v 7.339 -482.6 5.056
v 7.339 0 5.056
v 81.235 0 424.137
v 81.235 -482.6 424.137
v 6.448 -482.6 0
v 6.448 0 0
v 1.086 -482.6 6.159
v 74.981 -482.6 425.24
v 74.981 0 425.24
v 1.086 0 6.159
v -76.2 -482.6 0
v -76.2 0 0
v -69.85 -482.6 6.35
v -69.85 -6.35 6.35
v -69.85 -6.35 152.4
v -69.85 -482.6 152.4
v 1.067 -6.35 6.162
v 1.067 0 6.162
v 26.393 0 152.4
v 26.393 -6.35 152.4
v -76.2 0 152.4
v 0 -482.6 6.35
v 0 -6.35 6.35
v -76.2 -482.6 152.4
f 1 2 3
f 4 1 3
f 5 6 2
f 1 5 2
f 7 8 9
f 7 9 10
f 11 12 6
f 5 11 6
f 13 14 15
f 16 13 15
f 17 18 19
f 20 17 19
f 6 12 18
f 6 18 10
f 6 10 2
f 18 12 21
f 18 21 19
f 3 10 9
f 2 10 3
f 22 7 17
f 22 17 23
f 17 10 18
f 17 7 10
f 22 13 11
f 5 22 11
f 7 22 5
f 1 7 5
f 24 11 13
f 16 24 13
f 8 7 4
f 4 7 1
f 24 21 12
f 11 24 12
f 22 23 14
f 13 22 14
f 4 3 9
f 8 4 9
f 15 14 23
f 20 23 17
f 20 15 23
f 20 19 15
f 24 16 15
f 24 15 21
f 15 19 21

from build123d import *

# Parameters (mm, degrees)
F1_DEPTH = 482.6
F3_DEPTH = 6.35


with BuildPart() as f1:
    # F0 (on Front) → F1 (new body)
    with BuildSketch(Plane.XZ):
        Polygon((-69.85, 0), (0, 0), (1.085914, 6.158524), (0, 6.35), (-69.85, 6.35), align=None)
        Polygon((1.085914, 6.158524), (0, 0), (6.447959, 0), (7.339443, 5.055858), align=None)
        Polygon((74.981283, 425.239988), (1.085914, 6.158524), (7.339443, 5.055858), (81.234812, 424.137322), align=None)
        Polygon((-76.2, 0), (-69.85, 0), (-69.85, 6.35), (-69.85, 152.4), (-76.2, 152.4), align=None)
    extrude(amount=F1_DEPTH)

    # F2 (on Front) → F3 (join)
    with BuildSketch(Plane.XZ):
        Polygon((-76.2, 0), (0, 0), (26.39265, 152.4), (-76.2, 152.4), align=None)
    extrude(amount=F3_DEPTH)


solid = f1.part
